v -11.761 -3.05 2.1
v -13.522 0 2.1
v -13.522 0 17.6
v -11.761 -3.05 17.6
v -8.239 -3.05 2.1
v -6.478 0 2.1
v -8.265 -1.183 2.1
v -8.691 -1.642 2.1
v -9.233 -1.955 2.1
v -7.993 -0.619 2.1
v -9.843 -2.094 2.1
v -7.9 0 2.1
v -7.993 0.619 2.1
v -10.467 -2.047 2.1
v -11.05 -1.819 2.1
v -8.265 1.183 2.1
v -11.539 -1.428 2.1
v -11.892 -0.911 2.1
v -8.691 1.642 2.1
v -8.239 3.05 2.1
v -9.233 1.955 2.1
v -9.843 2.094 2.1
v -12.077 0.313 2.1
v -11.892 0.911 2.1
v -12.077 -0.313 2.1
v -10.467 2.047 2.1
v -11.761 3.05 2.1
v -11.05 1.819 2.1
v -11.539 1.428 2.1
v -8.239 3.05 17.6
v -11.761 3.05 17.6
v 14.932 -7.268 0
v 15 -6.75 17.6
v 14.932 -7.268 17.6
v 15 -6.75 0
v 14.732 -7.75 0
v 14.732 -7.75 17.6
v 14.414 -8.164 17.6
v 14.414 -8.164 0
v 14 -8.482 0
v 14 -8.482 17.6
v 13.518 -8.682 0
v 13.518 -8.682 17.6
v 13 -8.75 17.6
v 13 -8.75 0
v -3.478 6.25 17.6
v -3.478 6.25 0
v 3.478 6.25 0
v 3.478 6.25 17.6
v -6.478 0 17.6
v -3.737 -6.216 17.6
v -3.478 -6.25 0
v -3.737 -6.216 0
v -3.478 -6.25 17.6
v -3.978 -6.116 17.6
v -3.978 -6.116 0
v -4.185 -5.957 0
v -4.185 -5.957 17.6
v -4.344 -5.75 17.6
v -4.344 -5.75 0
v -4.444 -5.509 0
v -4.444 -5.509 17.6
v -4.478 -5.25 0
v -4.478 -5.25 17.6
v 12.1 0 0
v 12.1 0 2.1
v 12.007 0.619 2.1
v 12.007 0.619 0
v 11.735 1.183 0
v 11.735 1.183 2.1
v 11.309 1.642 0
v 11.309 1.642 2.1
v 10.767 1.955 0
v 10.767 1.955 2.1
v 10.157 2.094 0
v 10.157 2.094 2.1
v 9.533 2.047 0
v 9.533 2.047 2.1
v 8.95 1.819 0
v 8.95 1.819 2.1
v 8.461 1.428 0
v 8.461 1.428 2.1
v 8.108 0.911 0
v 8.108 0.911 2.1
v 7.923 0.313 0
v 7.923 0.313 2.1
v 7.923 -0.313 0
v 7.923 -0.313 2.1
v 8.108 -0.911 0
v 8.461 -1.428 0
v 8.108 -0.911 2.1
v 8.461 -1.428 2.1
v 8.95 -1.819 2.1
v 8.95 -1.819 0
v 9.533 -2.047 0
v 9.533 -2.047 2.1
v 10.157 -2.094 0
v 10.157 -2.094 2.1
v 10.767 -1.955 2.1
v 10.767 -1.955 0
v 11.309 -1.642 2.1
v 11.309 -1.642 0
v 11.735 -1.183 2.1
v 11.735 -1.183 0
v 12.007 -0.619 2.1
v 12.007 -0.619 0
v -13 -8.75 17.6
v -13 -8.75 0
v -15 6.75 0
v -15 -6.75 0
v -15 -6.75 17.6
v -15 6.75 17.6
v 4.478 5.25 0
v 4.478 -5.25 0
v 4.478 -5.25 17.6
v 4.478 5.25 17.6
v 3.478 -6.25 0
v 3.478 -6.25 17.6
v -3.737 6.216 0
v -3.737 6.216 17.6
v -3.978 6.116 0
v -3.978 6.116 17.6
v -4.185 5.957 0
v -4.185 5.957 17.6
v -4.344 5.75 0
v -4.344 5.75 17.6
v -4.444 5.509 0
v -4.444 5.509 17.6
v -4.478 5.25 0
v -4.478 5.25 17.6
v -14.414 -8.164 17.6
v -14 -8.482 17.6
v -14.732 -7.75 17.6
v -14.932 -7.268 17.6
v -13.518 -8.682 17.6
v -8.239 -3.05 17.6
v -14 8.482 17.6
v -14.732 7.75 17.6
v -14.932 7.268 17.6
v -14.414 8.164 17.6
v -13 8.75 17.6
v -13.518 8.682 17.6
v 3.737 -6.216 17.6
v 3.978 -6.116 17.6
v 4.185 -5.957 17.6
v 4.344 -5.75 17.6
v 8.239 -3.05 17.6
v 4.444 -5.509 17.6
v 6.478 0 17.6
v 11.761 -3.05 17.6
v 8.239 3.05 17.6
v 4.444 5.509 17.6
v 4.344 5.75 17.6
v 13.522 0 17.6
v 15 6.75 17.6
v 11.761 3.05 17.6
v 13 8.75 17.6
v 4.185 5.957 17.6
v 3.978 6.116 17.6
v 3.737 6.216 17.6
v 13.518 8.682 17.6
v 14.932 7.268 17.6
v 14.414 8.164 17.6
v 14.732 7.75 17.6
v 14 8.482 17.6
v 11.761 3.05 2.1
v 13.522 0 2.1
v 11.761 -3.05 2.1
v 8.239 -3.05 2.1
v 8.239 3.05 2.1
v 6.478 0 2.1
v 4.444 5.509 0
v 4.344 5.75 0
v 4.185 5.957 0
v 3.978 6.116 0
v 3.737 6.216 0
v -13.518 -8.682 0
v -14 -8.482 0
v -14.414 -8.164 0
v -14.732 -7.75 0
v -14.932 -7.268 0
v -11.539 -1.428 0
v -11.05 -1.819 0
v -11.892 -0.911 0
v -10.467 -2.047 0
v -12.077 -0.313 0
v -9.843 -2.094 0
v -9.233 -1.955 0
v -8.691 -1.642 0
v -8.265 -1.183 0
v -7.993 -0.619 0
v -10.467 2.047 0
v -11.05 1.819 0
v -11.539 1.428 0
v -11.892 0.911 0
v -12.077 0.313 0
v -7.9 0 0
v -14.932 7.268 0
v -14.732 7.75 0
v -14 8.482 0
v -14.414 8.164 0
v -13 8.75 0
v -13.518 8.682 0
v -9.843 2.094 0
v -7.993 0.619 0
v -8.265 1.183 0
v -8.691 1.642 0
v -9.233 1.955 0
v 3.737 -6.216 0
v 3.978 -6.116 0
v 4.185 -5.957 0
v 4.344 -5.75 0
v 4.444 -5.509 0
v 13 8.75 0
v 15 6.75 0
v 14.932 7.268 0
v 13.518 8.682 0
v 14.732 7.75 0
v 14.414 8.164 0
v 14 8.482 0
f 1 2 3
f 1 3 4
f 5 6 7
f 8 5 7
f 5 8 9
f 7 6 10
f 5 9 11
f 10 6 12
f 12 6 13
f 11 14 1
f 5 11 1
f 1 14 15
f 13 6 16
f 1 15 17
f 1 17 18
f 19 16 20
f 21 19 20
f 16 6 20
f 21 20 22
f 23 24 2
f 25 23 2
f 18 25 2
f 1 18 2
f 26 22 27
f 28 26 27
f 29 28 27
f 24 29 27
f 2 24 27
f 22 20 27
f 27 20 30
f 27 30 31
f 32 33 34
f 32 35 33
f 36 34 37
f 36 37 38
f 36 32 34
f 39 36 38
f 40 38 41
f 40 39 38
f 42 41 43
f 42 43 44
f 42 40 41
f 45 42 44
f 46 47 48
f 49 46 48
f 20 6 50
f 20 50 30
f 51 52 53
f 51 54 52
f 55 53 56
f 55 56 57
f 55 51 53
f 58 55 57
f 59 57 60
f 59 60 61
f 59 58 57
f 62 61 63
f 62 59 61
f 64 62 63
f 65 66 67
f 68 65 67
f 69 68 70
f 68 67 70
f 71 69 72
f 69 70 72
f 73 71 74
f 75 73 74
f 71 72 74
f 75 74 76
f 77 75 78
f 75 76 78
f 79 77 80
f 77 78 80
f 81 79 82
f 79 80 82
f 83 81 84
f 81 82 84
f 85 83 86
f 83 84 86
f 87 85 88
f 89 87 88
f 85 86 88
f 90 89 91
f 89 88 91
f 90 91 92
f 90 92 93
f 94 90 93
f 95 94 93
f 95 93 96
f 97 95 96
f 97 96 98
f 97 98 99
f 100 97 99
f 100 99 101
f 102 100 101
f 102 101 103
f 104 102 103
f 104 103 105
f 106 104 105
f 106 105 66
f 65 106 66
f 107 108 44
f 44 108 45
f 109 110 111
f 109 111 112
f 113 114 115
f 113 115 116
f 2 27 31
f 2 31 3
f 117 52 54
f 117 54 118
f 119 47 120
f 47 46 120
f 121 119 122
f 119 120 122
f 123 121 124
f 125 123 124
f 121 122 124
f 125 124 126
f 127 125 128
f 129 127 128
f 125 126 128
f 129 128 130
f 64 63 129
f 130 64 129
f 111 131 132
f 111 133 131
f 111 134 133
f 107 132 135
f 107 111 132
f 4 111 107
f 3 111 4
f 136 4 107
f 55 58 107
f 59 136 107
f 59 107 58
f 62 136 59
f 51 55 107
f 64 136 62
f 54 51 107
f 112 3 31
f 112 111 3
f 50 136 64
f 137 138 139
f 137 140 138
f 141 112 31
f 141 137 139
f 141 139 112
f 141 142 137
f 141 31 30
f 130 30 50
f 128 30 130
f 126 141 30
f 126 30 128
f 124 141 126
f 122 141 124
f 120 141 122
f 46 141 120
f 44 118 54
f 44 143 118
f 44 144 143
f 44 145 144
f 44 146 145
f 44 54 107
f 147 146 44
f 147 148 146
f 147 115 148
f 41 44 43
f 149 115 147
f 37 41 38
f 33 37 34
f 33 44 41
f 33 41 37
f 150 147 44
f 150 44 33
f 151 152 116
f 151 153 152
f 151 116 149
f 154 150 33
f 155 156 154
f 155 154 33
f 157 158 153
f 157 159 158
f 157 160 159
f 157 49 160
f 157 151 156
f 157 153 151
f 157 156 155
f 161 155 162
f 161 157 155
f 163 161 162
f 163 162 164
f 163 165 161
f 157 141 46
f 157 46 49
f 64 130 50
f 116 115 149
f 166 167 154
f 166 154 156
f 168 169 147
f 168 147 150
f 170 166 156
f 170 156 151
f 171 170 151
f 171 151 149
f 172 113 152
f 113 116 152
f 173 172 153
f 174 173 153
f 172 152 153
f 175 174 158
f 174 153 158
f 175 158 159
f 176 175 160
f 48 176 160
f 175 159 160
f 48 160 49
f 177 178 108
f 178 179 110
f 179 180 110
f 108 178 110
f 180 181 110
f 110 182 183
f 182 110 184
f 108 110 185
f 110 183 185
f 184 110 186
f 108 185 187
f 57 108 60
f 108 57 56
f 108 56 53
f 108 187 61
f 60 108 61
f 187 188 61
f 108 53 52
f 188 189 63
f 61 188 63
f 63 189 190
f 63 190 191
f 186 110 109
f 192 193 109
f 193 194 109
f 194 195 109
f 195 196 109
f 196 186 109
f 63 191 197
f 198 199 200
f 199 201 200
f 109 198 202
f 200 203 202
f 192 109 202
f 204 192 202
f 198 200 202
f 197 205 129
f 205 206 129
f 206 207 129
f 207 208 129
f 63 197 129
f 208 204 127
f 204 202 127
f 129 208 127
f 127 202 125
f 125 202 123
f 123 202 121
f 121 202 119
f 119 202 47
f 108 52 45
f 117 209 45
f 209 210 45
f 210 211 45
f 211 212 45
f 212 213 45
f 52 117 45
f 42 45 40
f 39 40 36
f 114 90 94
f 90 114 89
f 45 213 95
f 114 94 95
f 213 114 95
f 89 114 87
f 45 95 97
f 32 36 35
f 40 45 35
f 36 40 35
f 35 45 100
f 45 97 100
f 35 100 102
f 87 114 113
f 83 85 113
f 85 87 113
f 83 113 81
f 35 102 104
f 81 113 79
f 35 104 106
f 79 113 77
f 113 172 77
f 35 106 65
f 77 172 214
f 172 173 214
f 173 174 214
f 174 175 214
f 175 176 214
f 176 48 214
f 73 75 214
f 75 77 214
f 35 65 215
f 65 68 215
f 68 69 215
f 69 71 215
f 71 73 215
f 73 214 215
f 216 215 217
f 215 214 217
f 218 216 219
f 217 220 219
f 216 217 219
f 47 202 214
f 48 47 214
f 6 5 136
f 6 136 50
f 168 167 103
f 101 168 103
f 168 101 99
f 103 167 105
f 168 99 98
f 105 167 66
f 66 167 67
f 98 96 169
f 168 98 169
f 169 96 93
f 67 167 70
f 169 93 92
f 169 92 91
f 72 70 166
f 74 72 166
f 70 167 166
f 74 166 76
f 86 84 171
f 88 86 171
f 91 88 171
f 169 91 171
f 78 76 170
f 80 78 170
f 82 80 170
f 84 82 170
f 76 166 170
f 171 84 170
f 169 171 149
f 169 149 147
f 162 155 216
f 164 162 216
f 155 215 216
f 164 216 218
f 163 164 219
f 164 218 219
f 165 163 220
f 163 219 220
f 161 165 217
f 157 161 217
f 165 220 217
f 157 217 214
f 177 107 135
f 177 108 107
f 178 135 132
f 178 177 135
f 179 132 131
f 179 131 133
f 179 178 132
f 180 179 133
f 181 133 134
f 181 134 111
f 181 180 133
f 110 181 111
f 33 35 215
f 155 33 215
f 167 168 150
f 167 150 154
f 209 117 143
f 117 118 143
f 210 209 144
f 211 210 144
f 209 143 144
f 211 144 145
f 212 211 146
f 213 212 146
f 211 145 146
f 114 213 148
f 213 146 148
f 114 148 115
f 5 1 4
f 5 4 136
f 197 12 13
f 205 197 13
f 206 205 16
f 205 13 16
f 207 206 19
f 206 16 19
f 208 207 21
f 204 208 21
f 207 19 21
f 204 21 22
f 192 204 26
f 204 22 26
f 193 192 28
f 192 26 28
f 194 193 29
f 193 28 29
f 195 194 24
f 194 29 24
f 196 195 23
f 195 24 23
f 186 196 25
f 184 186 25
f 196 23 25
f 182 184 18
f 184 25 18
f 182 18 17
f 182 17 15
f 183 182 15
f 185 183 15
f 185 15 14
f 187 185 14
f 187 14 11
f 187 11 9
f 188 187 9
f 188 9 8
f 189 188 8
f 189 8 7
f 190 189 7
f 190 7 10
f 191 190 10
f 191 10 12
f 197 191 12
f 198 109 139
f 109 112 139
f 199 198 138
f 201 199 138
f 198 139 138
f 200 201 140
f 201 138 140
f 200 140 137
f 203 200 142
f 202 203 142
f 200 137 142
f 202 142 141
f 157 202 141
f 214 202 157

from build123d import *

# Parameters (mm, degrees)
SKETCH_1_W          = 30
SKETCH_1_H          = 17.5
SKETCH_1_W_2        = 8.956326716
SKETCH_1_H_2        = 12.5
EXTRUDE_1_DEPTH     = 17.6
FILLET_1_R          = 1
SKETCH_3_W          = 10.521836642
SKETCH_3_H          = 17.5
EXTRUDE_2_DEPTH     = 2.1
FILLET_2_R          = 2
SKETCH_4_R          = 2.1
CUT_EXTRUDE_1_DEPTH = 10


with BuildPart() as part:
    # 草图1 → 凸台-拉伸1 (new body)
    with BuildSketch(Plane.XY):
        Rectangle(SKETCH_1_W, SKETCH_1_H)
        Polygon((11.760918321, 3.05), (8.239081679, 3.05), (6.478163358, 0), (8.239081679, -3.05), (11.760918321, -3.05), (13.521836642, 0), align=None, mode=Mode.SUBTRACT)
        Polygon((-11.760918321, 3.05), (-13.521836642, 0), (-11.760918321, -3.05), (-8.239081679, -3.05), (-6.478163358, 0), (-8.239081679, 3.05), align=None, mode=Mode.SUBTRACT)
        Rectangle(SKETCH_1_W_2, SKETCH_1_H_2, mode=Mode.SUBTRACT)
    extrude(amount=EXTRUDE_1_DEPTH)

    # 圆角1
    fillet_1_edges = [part.edges().sort_by_distance(p)[0] for p in [
        (4.478163358, -6.25, 8.8),
        (4.478163358, 6.25, 8.8),
        (-4.478163358, 6.25, 8.8),
        (-4.478163358, -6.25, 8.8),
    ]]
    fillet(fillet_1_edges, radius=FILLET_1_R)

    # 草图3 → 凸台-拉伸2 (add)
    with BuildSketch(Plane(origin=(0, 0, 0), x_dir=(-1, 0, 0), z_dir=(0, 0, -1))):
        with Locations((-9.739081679, 0)):
            Rectangle(SKETCH_3_W, SKETCH_3_H)
        with Locations((9.739081679, 0)):
            Rectangle(SKETCH_3_W, SKETCH_3_H)
    extrude(amount=-EXTRUDE_2_DEPTH)

    # 圆角2
    fillet_2_edges = [part.edges().sort_by_distance(p)[0] for p in [
        (15, -8.75, 8.8),
        (-15, -8.75, 8.8),
        (-15, 8.75, 8.8),
        (15, 8.75, 8.8),
    ]]
    fillet(fillet_2_edges, radius=FILLET_2_R)

    # 草图4 → 切除-拉伸1 (cut)
    with BuildSketch(Plane.XY.offset(2.1)):
        with Locations((10, 0)):
            Circle(SKETCH_4_R)
        with Locations((-10, 0)):
            Circle(SKETCH_4_R)
    extrude(amount=-CUT_EXTRUDE_1_DEPTH, mode=Mode.SUBTRACT)


solid = part.part
